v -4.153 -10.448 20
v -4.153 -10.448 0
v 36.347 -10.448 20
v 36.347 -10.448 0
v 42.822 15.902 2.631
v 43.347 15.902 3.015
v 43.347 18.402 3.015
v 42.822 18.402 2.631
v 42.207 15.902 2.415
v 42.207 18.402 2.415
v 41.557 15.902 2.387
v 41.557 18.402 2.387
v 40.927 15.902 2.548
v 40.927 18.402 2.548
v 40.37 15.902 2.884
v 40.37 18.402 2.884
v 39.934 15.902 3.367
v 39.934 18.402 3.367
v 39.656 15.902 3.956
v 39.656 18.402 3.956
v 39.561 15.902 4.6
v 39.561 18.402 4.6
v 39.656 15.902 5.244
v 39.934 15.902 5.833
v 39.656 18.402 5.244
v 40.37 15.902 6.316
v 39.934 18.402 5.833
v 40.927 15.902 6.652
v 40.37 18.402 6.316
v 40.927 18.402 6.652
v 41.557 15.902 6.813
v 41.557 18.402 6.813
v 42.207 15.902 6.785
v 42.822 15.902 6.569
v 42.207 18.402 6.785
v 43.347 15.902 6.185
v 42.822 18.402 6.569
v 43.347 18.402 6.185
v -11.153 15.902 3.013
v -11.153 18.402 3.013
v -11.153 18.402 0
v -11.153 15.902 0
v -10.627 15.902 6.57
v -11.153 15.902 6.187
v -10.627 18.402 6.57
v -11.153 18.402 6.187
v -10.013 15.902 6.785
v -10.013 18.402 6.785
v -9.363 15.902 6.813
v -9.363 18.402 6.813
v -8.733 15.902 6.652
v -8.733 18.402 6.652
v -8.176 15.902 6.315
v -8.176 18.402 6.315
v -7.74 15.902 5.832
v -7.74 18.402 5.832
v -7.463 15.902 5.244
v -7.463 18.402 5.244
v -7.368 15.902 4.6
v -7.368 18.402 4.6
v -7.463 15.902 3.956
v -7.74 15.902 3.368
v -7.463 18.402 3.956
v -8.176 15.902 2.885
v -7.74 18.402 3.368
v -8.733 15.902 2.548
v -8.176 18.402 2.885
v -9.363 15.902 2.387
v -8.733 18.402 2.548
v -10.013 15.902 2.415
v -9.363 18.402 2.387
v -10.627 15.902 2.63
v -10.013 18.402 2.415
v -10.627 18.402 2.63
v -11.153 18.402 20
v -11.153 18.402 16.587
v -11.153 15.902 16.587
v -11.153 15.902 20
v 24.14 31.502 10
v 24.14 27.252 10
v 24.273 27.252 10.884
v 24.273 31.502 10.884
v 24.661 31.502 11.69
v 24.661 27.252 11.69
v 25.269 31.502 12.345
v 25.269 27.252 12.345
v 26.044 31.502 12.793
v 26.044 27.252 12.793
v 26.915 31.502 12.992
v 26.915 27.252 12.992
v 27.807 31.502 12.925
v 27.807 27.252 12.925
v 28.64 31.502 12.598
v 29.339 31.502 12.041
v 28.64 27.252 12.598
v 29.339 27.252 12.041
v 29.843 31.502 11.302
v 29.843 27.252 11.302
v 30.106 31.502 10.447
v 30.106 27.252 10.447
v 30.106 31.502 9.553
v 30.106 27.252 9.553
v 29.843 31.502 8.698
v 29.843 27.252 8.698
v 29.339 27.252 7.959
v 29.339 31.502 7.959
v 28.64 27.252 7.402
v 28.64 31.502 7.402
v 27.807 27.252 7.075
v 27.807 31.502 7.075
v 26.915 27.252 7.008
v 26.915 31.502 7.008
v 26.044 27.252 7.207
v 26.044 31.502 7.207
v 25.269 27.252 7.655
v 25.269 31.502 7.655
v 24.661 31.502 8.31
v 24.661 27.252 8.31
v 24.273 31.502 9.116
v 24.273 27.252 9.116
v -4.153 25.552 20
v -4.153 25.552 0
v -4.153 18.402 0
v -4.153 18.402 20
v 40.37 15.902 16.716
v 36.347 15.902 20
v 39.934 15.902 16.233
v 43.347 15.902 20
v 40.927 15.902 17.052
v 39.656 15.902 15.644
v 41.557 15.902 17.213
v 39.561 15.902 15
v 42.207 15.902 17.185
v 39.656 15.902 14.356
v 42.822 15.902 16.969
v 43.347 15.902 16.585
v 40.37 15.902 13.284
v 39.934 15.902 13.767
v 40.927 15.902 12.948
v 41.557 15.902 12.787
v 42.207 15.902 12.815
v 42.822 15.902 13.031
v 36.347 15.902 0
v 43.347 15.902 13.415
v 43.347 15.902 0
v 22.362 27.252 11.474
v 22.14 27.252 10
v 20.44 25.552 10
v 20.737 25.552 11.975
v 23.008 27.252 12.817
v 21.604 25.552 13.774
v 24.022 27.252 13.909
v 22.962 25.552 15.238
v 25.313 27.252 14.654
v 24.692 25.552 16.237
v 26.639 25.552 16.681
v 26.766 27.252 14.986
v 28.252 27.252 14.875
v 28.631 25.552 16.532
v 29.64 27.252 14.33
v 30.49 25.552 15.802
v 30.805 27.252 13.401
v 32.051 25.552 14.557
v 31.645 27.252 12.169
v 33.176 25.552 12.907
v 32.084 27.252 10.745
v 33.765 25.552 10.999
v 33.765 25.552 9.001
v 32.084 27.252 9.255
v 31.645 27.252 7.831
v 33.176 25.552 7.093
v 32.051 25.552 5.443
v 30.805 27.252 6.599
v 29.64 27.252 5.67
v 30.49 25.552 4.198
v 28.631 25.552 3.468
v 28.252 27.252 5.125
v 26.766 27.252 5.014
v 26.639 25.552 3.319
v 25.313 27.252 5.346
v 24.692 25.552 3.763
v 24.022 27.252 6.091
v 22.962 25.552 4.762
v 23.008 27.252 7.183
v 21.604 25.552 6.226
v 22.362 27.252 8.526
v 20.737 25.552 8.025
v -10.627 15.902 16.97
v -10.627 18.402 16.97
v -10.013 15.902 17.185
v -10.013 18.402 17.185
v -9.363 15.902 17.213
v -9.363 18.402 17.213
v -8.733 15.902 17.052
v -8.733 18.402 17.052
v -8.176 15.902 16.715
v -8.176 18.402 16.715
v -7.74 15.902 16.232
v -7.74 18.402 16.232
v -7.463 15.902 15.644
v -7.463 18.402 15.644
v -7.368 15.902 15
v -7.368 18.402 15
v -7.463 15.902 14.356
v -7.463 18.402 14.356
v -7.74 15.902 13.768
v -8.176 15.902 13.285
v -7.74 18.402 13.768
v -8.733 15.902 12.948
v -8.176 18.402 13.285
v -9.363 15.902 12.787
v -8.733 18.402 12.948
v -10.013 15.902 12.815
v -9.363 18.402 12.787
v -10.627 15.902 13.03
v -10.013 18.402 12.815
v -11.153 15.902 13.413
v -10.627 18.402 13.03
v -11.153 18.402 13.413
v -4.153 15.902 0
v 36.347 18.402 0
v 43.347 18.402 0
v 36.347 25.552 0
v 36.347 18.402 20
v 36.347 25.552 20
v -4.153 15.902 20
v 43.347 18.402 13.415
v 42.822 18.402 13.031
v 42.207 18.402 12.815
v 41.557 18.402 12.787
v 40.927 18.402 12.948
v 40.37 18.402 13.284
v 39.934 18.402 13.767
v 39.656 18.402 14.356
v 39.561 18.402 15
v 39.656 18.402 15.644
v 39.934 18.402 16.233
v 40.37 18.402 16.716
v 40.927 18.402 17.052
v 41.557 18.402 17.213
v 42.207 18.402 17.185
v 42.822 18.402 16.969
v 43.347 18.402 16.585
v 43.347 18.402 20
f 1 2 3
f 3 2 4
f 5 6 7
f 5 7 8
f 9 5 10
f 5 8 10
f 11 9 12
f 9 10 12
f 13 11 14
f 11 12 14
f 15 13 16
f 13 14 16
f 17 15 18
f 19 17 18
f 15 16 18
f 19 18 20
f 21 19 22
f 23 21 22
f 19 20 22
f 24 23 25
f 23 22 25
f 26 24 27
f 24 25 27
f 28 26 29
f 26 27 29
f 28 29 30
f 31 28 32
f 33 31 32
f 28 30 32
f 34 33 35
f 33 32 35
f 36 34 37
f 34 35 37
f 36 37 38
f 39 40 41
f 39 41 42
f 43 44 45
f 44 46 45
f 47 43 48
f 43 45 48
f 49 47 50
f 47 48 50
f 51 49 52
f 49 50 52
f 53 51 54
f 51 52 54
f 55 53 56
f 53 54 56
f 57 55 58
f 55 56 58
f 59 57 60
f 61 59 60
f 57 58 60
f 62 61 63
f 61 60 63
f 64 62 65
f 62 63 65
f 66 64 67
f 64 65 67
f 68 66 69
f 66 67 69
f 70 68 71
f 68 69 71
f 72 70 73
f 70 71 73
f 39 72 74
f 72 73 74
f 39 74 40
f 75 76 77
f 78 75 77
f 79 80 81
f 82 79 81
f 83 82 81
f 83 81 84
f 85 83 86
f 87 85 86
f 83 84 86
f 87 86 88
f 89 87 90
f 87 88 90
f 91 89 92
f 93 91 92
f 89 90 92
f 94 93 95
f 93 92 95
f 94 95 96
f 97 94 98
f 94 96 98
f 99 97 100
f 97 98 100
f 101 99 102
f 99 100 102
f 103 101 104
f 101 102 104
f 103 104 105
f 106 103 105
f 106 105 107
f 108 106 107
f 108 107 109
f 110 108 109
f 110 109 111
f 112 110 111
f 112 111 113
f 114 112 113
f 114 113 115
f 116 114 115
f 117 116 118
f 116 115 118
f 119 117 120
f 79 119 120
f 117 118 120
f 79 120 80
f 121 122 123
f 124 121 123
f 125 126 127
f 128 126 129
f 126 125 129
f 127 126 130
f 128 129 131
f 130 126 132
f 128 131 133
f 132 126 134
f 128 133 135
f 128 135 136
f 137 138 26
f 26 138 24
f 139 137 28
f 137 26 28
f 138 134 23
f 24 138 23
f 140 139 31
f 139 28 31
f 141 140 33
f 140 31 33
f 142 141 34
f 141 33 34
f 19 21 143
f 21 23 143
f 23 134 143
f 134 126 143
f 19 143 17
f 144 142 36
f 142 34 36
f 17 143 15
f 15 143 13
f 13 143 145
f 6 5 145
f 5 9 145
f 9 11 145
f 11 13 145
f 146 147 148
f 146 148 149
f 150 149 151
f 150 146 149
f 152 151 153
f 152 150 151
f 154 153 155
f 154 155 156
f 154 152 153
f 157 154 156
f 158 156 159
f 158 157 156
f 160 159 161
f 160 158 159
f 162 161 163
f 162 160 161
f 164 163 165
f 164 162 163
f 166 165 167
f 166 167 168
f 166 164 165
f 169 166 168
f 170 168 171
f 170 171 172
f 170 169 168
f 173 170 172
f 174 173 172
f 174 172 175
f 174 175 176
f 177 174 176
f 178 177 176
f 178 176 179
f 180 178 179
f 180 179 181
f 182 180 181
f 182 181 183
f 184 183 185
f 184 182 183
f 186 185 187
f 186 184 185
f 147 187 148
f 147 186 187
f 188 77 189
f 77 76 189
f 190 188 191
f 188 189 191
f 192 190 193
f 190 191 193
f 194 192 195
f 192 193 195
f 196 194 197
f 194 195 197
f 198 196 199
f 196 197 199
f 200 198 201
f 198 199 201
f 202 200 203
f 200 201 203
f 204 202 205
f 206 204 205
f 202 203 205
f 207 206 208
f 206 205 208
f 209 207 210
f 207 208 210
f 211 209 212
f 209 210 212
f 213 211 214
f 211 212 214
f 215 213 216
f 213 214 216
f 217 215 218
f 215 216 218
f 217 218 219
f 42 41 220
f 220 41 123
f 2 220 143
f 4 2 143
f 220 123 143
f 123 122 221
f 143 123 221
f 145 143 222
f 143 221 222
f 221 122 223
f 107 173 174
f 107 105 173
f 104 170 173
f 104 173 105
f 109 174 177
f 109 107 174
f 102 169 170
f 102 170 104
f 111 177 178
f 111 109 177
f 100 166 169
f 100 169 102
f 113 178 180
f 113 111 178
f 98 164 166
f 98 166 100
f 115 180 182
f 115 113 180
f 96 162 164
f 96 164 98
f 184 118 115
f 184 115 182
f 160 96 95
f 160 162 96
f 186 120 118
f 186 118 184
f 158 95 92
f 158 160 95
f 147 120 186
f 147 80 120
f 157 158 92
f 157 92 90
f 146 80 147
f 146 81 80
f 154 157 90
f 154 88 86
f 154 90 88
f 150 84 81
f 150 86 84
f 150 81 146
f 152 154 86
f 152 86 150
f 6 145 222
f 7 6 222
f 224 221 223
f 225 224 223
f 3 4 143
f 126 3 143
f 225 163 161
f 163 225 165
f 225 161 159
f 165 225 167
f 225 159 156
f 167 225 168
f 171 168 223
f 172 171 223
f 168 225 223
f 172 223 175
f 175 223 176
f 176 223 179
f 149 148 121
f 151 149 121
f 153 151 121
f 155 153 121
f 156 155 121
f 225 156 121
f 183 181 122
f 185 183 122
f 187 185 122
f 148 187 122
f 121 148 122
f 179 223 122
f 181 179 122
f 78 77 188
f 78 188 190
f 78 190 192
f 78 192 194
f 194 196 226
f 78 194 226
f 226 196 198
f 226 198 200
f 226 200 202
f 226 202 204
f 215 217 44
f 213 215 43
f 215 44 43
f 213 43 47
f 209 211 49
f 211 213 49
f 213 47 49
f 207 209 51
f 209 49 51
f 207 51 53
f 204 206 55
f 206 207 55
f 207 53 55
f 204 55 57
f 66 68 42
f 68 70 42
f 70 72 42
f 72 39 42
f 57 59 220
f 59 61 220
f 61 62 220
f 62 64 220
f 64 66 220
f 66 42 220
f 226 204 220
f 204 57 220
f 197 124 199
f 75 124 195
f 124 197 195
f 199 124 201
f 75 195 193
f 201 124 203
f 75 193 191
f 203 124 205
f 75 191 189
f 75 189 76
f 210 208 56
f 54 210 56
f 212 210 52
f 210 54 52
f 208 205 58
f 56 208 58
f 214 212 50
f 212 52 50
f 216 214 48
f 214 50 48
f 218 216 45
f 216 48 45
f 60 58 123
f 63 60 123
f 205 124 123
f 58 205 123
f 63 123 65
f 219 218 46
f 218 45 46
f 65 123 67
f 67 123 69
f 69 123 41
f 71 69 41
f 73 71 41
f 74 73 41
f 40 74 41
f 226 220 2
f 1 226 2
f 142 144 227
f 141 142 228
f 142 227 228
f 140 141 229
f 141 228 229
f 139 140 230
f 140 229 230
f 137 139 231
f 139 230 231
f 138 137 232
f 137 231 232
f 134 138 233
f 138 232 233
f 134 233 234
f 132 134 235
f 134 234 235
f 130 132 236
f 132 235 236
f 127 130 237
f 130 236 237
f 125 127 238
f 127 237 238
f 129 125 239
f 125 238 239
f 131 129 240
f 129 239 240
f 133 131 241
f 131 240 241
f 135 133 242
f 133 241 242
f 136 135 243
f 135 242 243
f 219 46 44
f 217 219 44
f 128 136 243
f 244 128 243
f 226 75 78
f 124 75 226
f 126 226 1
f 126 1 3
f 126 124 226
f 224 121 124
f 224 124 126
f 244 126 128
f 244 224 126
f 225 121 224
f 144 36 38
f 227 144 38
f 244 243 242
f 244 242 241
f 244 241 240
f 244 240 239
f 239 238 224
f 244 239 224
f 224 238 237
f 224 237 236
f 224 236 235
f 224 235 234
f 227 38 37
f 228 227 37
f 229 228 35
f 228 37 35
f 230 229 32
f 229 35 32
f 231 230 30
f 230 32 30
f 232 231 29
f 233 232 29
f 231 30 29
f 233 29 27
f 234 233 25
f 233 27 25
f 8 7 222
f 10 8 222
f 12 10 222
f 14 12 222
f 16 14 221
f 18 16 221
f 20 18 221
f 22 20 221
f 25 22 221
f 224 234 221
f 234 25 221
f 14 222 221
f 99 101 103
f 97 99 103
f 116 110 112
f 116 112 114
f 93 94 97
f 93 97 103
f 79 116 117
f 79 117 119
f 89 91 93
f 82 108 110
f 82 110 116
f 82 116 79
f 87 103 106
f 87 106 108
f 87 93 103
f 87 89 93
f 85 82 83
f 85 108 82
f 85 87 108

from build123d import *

# Parameters (mm, degrees)
EXTRUDE_1_DEPTH     = 20
SKETCH_2_R          = 2.225
CUT_EXTRUDE_4_DEPTH = 5
SKETCH_3_R          = 2.225
CUT_EXTRUDE_5_DEPTH = 5
SKETCH_4_R          = 5
EXTRUDE_3_DEPTH     = 1.7
CHAMFER_3_SIZE      = 1.7
SKETCH_5_R          = 3
EXTRUDE_4_DEPTH     = 4.25


with BuildPart() as part:
    # 草圖1 → 填料-伸長1 (new body)
    with BuildSketch(Plane.XY):
        Polygon((-4.152823353, 15.901861702), (-4.152823353, -10.448138298), (36.347176647, -10.448138298), (36.347176647, 15.901861702), (43.347176647, 15.901861702), (43.347176647, 18.401861702), (36.347176647, 18.401861702), (36.347176647, 25.551861702), (-4.152823353, 25.551861702), (-4.152823353, 18.401861702), (-11.152823353, 18.401861702), (-11.152823353, 15.901861702), align=None)
    extrude(amount=EXTRUDE_1_DEPTH)

    # 草圖2 → 除料-伸長4 (cut)
    with BuildSketch(Plane(origin=(0, 18.401861702, 0), x_dir=(1, 0, 0), z_dir=(0, 1, 0))):
        with Locations((41.785976647, -4.6)):
            Circle(SKETCH_2_R)
        with Locations((41.785976647, -15)):
            Circle(SKETCH_2_R)
    extrude(amount=-CUT_EXTRUDE_4_DEPTH, mode=Mode.SUBTRACT)

    # 草圖3 → 除料-伸長5 (cut)
    with BuildSketch(Plane(origin=(0, 18.401861702, 0), x_dir=(1, 0, 0), z_dir=(0, 1, 0))):
        with Locations((-9.592823353, -4.6)):
            Circle(SKETCH_3_R)
        with Locations((-9.592823353, -15)):
            Circle(SKETCH_3_R)
    extrude(amount=-CUT_EXTRUDE_5_DEPTH, mode=Mode.SUBTRACT)

    # 草圖4 → 填料-伸長3 (add)
    with BuildSketch(Plane(origin=(0, 25.551861702, 0), x_dir=(1, 0, 0), z_dir=(0, 1, 0))):
        with Locations(Location((27.139664618, -10, 0), (0, 0, 180))):
            Circle(SKETCH_4_R)
    extrude(amount=EXTRUDE_3_DEPTH)

    # 導角3
    chamfer_3_edges = [part.edges().sort_by_distance(p)[0] for p in [
        (32.139664618, 25.551861702, 10),
    ]]
    chamfer(chamfer_3_edges, length=CHAMFER_3_SIZE - 0.0001)  # a hair under: the kernel refuses the full size

    # 草圖5 → 填料-伸長4 (add)
    with BuildSketch(Plane(origin=(0, 27.251861702, 0), x_dir=(1, 0, 0), z_dir=(0, 1, 0))):
        with Locations(Location((27.139664618, -10, 0), (0, 0, 180))):
            Circle(SKETCH_5_R)
    extrude(amount=EXTRUDE_4_DEPTH)


solid = part.part
